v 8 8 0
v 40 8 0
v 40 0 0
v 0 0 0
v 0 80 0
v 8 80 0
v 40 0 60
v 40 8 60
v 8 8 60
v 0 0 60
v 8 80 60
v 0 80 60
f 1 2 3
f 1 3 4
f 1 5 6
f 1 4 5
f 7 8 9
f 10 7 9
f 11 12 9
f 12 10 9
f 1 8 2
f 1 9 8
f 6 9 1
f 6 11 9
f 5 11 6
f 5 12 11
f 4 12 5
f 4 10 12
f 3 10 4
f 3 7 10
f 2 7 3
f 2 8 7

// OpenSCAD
$fn = 32;

// ----------------------------------------------------------------------
// Structural section: angle 40 x 80 mm
// ----------------------------------------------------------------------

// --- parameters (mm) ---
sec_w = 40;               // leg width, X
sec_h = 80;               // leg height, Y
flange_t = 8;             // leg thickness
plate_t = 60;             // cut length, Z (extrusion height)

profile = [[0, 0], [40, 0], [40, 8], [8, 8], [8, 80], [0, 80]];  // primary outline, 6 points, counter clockwise

// --- the one profile operation ---
linear_extrude(height = plate_t) polygon(points = profile);
